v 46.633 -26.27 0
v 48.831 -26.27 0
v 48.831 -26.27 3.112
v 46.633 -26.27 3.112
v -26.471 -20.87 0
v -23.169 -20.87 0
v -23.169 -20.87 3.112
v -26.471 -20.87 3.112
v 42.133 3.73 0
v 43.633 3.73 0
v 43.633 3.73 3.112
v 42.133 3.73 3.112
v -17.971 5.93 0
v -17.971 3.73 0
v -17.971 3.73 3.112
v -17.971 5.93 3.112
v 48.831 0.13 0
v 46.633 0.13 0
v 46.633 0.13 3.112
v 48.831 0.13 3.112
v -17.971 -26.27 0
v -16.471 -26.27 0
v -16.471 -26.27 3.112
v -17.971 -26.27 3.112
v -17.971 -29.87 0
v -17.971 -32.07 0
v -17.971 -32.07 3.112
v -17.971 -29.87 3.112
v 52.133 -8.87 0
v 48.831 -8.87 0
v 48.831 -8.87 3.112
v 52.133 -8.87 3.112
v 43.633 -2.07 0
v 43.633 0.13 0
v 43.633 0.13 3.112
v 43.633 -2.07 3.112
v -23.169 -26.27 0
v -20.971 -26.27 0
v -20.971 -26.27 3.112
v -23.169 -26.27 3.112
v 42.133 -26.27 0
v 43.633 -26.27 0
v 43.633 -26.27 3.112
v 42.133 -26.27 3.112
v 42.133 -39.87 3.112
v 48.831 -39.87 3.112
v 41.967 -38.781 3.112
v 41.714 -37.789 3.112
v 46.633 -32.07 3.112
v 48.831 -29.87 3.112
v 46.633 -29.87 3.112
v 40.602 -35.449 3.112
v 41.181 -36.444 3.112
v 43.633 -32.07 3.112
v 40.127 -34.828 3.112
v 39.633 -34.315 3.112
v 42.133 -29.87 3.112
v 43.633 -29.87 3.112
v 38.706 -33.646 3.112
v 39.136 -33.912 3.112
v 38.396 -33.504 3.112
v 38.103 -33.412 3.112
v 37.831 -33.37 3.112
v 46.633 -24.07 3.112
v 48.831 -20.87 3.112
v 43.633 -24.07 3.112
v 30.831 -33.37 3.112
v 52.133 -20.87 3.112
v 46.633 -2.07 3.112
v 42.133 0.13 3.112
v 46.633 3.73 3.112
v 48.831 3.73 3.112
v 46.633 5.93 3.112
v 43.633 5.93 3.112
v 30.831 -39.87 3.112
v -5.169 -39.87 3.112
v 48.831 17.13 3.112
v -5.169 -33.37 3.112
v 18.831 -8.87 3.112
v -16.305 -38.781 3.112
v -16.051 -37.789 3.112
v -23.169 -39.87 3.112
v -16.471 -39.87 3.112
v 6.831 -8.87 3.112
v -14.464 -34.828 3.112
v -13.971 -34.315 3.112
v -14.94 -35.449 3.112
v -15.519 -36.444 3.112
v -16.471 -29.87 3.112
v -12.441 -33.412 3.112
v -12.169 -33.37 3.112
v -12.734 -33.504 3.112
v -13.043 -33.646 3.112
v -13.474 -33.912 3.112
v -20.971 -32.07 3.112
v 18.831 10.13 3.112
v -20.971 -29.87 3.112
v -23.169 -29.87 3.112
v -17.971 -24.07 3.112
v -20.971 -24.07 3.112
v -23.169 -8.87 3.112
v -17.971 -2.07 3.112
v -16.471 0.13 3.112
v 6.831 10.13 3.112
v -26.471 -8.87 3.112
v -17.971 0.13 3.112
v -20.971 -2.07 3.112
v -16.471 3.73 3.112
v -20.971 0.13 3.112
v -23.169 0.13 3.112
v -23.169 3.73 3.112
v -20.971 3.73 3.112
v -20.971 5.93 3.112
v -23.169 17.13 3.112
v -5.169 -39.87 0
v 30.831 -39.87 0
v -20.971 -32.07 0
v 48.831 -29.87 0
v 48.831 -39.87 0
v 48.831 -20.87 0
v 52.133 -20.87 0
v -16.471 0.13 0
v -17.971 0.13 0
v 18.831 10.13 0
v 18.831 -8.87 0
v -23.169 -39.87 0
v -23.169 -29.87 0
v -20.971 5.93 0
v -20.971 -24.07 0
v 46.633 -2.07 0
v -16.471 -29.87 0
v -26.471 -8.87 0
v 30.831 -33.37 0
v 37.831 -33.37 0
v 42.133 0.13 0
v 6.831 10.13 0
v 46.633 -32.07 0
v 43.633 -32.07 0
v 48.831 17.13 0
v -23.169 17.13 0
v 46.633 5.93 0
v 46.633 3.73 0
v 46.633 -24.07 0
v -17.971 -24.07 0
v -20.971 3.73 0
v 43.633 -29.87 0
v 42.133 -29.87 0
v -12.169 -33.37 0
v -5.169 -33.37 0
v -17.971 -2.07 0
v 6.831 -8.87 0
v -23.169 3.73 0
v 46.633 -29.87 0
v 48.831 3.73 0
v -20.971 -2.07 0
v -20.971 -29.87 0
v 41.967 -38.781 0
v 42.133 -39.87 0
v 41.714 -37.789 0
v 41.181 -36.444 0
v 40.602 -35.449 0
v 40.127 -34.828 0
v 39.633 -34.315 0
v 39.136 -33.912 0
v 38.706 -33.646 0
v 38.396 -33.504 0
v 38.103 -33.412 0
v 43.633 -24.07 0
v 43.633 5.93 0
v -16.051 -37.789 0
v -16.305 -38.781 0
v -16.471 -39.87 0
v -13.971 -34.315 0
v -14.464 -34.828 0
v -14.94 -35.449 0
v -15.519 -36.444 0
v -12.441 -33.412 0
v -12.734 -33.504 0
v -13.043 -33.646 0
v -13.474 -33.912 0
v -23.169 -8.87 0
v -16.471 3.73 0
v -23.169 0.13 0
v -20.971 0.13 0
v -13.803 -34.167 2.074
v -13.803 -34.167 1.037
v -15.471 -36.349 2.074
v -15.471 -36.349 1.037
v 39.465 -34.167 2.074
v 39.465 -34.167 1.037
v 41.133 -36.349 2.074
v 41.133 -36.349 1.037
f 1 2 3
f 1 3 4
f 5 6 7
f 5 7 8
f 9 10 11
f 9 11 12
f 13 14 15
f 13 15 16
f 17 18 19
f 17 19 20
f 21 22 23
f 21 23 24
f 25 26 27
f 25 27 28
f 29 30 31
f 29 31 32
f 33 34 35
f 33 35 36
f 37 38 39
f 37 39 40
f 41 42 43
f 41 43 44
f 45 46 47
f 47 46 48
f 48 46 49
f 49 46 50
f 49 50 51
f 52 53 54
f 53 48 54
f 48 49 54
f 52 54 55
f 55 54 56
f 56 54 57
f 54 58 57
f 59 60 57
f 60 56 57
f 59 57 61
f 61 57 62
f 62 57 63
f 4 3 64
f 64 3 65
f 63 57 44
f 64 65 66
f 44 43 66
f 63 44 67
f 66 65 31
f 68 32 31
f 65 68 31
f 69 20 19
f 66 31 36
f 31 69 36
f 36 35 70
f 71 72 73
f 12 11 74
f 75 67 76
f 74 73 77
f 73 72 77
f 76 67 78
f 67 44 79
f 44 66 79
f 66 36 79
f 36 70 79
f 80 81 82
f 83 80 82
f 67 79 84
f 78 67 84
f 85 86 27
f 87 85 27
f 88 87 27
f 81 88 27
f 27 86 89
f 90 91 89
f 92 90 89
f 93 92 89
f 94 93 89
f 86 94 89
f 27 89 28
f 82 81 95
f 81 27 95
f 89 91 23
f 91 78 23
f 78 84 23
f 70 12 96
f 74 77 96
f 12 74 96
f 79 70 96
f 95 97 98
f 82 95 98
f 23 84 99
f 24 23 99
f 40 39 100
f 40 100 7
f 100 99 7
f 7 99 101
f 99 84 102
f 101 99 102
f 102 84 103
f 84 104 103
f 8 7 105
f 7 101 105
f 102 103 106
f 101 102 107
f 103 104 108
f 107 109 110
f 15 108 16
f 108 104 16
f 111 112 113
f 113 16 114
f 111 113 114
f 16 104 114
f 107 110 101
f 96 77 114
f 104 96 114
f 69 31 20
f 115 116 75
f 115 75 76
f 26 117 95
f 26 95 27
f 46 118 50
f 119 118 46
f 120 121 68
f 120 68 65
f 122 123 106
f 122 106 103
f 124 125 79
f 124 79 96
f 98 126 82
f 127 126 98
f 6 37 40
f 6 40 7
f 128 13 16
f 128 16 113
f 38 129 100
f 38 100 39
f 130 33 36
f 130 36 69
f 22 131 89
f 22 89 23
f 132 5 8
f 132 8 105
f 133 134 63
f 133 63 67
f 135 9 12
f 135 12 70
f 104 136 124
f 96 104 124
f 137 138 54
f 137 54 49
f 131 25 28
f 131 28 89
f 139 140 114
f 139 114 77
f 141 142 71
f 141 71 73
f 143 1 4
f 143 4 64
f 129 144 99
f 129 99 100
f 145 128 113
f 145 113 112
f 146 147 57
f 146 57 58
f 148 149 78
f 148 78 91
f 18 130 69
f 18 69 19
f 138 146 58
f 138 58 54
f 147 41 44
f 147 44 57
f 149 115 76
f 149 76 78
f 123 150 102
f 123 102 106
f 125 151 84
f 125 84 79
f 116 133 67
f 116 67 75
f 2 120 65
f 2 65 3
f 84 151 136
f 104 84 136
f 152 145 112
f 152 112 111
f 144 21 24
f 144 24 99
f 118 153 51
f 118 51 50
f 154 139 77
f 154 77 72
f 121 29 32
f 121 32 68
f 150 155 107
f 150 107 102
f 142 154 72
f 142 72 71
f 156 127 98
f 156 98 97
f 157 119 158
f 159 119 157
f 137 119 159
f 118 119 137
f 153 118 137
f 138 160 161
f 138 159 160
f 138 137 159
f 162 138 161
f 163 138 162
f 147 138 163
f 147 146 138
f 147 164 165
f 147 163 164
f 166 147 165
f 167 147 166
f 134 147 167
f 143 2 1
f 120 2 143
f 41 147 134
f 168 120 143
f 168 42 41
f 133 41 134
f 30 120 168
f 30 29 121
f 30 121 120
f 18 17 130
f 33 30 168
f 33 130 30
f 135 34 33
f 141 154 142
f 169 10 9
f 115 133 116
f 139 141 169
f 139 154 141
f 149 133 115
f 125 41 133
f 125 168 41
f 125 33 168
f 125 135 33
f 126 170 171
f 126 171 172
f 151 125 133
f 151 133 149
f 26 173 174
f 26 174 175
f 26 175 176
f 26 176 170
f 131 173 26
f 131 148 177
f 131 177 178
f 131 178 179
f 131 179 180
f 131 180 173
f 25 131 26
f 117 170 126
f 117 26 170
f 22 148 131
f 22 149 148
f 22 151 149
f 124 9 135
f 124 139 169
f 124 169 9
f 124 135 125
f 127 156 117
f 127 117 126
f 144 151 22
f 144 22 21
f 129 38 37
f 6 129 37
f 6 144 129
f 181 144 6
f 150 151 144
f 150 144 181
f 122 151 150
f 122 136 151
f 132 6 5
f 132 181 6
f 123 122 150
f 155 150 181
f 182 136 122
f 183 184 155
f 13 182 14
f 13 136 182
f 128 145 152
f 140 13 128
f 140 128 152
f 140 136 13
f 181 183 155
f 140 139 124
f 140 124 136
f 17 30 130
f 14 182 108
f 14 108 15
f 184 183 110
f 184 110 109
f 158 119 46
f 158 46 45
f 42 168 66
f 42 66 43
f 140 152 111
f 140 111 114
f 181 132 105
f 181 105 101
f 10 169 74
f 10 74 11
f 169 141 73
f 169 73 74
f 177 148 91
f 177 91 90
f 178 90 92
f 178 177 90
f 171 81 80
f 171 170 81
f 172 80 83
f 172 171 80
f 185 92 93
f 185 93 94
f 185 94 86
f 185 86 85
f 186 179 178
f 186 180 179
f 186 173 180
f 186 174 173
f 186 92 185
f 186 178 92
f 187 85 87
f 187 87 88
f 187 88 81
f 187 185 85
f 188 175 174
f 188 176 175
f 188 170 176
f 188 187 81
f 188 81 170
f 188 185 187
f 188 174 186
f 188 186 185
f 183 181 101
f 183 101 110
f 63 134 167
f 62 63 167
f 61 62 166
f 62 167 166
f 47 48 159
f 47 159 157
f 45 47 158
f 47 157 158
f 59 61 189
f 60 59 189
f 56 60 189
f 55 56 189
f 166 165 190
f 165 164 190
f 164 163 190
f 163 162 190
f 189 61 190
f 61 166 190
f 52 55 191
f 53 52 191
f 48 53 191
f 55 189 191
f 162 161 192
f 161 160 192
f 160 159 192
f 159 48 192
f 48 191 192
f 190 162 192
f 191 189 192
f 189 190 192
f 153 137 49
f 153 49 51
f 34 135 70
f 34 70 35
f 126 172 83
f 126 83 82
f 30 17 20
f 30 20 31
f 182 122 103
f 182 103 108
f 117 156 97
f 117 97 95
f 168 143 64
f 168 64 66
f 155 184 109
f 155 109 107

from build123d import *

# Parameters (mm, degrees)
SKETCH2_W           = 12
SKETCH2_H           = 19
BOSS_EXTRUDE1_DEPTH = 3.1115


with BuildPart() as part:
    # Sketch2 → Boss-Extrude1 (new body)
    with BuildSketch(Plane.XY):
        with BuildLine():
            Line((-5.168924328, -39.869822198), (-5.168924328, -33.369822198))
            Line((-5.168924328, -33.369822198), (-12.168924328, -33.369822198))
            add(Edge.make_bspline(
                [(-12.168924328, -33.369822198), (-13.552096669, -33.459867166), (-16.039644903, -35.695120164), (-16.470924328, -39.869822198)],
                knots=[0, 0, 0, 0, 1, 1, 1, 1], degree=3))
            Line((-16.470924328, -39.869822198), (-23.168924328, -39.869822198))
            Line((-23.168924328, -39.869822198), (-23.168924328, -33.469822198))
            Line((-23.168924328, -33.469822198), (-23.168924328, -29.869822198))
            Line((-23.168924328, -29.869822198), (-20.970924328, -29.869822198))
            Line((-20.970924328, -29.869822198), (-20.970924328, -32.069822198))
            Line((-20.970924328, -32.069822198), (-17.970924328, -32.069822198))
            Line((-17.970924328, -32.069822198), (-17.970924328, -29.869822198))
            Line((-17.970924328, -29.869822198), (-16.470924328, -29.869822198))
            Line((-16.470924328, -29.869822198), (-16.470924328, -26.269822198))
            Line((-16.470924328, -26.269822198), (-17.970924328, -26.269822198))
            Line((-17.970924328, -26.269822198), (-17.970924328, -24.069822198))
            Line((-17.970924328, -24.069822198), (-20.970924328, -24.069822198))
            Line((-20.970924328, -24.069822198), (-20.970924328, -26.269822198))
            Line((-20.970924328, -26.269822198), (-23.168924328, -26.269822198))
            Line((-23.168924328, -26.269822198), (-23.168924328, -20.869822198))
            Line((-23.168924328, -20.869822198), (-26.470924328, -20.869822198))
            Line((-26.470924328, -20.869822198), (-26.470924328, -8.869822198))
            Line((-26.470924328, -8.869822198), (-23.168924328, -8.869822198))
            Line((-23.168924328, -8.869822198), (-23.168924328, 0.130177802))
            Line((-23.168924328, 0.130177802), (-20.979823214, 0.130177802))
            Line((-20.979823214, 0.130177802), (-20.970924328, 0.130177802))
            Line((-20.970924328, 0.130177802), (-20.970924328, -2.069822198))
            Line((-20.970924328, -2.069822198), (-17.970924328, -2.069822198))
            Line((-17.970924328, -2.069822198), (-17.970924328, 0.130177802))
            Line((-17.970924328, 0.130177802), (-16.470924328, 0.130177802))
            Line((-16.470924328, 0.130177802), (-16.470924328, 3.730177802))
            Line((-16.470924328, 3.730177802), (-17.970924328, 3.730177802))
            Line((-17.970924328, 3.730177802), (-17.970924328, 5.930177802))
            Line((-17.970924328, 5.930177802), (-20.970924328, 5.930177802))
            Line((-20.970924328, 5.930177802), (-20.970924328, 3.730177802))
            Line((-20.970924328, 3.730177802), (-20.979823214, 3.730177802))
            Line((-20.979823214, 3.730177802), (-23.168924328, 3.730177802))
            Line((-23.168924328, 3.730177802), (-23.168924328, 10.130177802))
            Line((-23.168924328, 10.130177802), (-23.168924328, 17.130177802))
            Line((-23.168924328, 17.130177802), (48.831075672, 17.130177802))
            Line((48.831075672, 17.130177802), (48.831075672, 10.130177802))
            Line((48.831075672, 10.130177802), (48.831075672, 3.730177802))
            Line((48.831075672, 3.730177802), (46.641974559, 3.730177802))
            Line((46.641974559, 3.730177802), (46.633075672, 3.730177802))
            Line((46.633075672, 3.730177802), (46.633075672, 5.930177802))
            Line((46.633075672, 5.930177802), (43.633075672, 5.930177802))
            Line((43.633075672, 5.930177802), (43.633075672, 3.730177802))
            Line((43.633075672, 3.730177802), (42.133075672, 3.730177802))
            Line((42.133075672, 3.730177802), (42.133075672, 0.130177802))
            Line((42.133075672, 0.130177802), (43.633075672, 0.130177802))
            Line((43.633075672, 0.130177802), (43.633075672, -2.069822198))
            Line((43.633075672, -2.069822198), (46.633075672, -2.069822198))
            Line((46.633075672, -2.069822198), (46.633075672, 0.130177802))
            Line((46.633075672, 0.130177802), (46.641974559, 0.130177802))
            Line((46.641974559, 0.130177802), (48.831075672, 0.130177802))
            Line((48.831075672, 0.130177802), (48.831075672, -3.469822198))
            Line((48.831075672, -3.469822198), (48.831075672, -6.869822198))
            Line((48.831075672, -6.869822198), (48.831075672, -8.869822198))
            Line((48.831075672, -8.869822198), (52.133075672, -8.869822198))
            Line((52.133075672, -8.869822198), (52.133075672, -20.869822198))
            Line((52.133075672, -20.869822198), (48.831075672, -20.869822198))
            Line((48.831075672, -20.869822198), (48.831075672, -22.869822198))
            Line((48.831075672, -22.869822198), (48.831075672, -26.269822198))
            Line((48.831075672, -26.269822198), (46.633075672, -26.269822198))
            Line((46.633075672, -26.269822198), (46.633075672, -24.069822198))
            Line((46.633075672, -24.069822198), (43.633075672, -24.069822198))
            Line((43.633075672, -24.069822198), (43.633075672, -26.269822198))
            Line((43.633075672, -26.269822198), (42.133075672, -26.269822198))
            Line((42.133075672, -26.269822198), (42.133075672, -29.869822198))
            Line((42.133075672, -29.869822198), (43.633075672, -29.869822198))
            Line((43.633075672, -29.869822198), (43.633075672, -32.069822198))
            Line((43.633075672, -32.069822198), (46.633075672, -32.069822198))
            Line((46.633075672, -32.069822198), (46.633075672, -29.869822198))
            Line((46.633075672, -29.869822198), (48.831075672, -29.869822198))
            Line((48.831075672, -29.869822198), (48.831075672, -39.869822198))
            Line((48.831075672, -39.869822198), (42.133075672, -39.869822198))
            add(Edge.make_bspline(
                [(37.831075672, -33.369822198), (39.214248014, -33.459867166), (41.701796248, -35.695120164), (42.133075672, -39.869822198)],
                knots=[0, 0, 0, 0, 1, 1, 1, 1], degree=3))
            Line((37.831075672, -33.369822198), (30.831075672, -33.369822198))
            Line((30.831075672, -33.369822198), (30.831075672, -39.869822198))
            Line((30.831075672, -39.869822198), (-5.168924328, -39.869822198))
        make_face()
        with Locations((12.831075672, 0.630177802)):
            Rectangle(SKETCH2_W, SKETCH2_H, mode=Mode.SUBTRACT)
    extrude(amount=BOSS_EXTRUDE1_DEPTH)


solid = part.part
